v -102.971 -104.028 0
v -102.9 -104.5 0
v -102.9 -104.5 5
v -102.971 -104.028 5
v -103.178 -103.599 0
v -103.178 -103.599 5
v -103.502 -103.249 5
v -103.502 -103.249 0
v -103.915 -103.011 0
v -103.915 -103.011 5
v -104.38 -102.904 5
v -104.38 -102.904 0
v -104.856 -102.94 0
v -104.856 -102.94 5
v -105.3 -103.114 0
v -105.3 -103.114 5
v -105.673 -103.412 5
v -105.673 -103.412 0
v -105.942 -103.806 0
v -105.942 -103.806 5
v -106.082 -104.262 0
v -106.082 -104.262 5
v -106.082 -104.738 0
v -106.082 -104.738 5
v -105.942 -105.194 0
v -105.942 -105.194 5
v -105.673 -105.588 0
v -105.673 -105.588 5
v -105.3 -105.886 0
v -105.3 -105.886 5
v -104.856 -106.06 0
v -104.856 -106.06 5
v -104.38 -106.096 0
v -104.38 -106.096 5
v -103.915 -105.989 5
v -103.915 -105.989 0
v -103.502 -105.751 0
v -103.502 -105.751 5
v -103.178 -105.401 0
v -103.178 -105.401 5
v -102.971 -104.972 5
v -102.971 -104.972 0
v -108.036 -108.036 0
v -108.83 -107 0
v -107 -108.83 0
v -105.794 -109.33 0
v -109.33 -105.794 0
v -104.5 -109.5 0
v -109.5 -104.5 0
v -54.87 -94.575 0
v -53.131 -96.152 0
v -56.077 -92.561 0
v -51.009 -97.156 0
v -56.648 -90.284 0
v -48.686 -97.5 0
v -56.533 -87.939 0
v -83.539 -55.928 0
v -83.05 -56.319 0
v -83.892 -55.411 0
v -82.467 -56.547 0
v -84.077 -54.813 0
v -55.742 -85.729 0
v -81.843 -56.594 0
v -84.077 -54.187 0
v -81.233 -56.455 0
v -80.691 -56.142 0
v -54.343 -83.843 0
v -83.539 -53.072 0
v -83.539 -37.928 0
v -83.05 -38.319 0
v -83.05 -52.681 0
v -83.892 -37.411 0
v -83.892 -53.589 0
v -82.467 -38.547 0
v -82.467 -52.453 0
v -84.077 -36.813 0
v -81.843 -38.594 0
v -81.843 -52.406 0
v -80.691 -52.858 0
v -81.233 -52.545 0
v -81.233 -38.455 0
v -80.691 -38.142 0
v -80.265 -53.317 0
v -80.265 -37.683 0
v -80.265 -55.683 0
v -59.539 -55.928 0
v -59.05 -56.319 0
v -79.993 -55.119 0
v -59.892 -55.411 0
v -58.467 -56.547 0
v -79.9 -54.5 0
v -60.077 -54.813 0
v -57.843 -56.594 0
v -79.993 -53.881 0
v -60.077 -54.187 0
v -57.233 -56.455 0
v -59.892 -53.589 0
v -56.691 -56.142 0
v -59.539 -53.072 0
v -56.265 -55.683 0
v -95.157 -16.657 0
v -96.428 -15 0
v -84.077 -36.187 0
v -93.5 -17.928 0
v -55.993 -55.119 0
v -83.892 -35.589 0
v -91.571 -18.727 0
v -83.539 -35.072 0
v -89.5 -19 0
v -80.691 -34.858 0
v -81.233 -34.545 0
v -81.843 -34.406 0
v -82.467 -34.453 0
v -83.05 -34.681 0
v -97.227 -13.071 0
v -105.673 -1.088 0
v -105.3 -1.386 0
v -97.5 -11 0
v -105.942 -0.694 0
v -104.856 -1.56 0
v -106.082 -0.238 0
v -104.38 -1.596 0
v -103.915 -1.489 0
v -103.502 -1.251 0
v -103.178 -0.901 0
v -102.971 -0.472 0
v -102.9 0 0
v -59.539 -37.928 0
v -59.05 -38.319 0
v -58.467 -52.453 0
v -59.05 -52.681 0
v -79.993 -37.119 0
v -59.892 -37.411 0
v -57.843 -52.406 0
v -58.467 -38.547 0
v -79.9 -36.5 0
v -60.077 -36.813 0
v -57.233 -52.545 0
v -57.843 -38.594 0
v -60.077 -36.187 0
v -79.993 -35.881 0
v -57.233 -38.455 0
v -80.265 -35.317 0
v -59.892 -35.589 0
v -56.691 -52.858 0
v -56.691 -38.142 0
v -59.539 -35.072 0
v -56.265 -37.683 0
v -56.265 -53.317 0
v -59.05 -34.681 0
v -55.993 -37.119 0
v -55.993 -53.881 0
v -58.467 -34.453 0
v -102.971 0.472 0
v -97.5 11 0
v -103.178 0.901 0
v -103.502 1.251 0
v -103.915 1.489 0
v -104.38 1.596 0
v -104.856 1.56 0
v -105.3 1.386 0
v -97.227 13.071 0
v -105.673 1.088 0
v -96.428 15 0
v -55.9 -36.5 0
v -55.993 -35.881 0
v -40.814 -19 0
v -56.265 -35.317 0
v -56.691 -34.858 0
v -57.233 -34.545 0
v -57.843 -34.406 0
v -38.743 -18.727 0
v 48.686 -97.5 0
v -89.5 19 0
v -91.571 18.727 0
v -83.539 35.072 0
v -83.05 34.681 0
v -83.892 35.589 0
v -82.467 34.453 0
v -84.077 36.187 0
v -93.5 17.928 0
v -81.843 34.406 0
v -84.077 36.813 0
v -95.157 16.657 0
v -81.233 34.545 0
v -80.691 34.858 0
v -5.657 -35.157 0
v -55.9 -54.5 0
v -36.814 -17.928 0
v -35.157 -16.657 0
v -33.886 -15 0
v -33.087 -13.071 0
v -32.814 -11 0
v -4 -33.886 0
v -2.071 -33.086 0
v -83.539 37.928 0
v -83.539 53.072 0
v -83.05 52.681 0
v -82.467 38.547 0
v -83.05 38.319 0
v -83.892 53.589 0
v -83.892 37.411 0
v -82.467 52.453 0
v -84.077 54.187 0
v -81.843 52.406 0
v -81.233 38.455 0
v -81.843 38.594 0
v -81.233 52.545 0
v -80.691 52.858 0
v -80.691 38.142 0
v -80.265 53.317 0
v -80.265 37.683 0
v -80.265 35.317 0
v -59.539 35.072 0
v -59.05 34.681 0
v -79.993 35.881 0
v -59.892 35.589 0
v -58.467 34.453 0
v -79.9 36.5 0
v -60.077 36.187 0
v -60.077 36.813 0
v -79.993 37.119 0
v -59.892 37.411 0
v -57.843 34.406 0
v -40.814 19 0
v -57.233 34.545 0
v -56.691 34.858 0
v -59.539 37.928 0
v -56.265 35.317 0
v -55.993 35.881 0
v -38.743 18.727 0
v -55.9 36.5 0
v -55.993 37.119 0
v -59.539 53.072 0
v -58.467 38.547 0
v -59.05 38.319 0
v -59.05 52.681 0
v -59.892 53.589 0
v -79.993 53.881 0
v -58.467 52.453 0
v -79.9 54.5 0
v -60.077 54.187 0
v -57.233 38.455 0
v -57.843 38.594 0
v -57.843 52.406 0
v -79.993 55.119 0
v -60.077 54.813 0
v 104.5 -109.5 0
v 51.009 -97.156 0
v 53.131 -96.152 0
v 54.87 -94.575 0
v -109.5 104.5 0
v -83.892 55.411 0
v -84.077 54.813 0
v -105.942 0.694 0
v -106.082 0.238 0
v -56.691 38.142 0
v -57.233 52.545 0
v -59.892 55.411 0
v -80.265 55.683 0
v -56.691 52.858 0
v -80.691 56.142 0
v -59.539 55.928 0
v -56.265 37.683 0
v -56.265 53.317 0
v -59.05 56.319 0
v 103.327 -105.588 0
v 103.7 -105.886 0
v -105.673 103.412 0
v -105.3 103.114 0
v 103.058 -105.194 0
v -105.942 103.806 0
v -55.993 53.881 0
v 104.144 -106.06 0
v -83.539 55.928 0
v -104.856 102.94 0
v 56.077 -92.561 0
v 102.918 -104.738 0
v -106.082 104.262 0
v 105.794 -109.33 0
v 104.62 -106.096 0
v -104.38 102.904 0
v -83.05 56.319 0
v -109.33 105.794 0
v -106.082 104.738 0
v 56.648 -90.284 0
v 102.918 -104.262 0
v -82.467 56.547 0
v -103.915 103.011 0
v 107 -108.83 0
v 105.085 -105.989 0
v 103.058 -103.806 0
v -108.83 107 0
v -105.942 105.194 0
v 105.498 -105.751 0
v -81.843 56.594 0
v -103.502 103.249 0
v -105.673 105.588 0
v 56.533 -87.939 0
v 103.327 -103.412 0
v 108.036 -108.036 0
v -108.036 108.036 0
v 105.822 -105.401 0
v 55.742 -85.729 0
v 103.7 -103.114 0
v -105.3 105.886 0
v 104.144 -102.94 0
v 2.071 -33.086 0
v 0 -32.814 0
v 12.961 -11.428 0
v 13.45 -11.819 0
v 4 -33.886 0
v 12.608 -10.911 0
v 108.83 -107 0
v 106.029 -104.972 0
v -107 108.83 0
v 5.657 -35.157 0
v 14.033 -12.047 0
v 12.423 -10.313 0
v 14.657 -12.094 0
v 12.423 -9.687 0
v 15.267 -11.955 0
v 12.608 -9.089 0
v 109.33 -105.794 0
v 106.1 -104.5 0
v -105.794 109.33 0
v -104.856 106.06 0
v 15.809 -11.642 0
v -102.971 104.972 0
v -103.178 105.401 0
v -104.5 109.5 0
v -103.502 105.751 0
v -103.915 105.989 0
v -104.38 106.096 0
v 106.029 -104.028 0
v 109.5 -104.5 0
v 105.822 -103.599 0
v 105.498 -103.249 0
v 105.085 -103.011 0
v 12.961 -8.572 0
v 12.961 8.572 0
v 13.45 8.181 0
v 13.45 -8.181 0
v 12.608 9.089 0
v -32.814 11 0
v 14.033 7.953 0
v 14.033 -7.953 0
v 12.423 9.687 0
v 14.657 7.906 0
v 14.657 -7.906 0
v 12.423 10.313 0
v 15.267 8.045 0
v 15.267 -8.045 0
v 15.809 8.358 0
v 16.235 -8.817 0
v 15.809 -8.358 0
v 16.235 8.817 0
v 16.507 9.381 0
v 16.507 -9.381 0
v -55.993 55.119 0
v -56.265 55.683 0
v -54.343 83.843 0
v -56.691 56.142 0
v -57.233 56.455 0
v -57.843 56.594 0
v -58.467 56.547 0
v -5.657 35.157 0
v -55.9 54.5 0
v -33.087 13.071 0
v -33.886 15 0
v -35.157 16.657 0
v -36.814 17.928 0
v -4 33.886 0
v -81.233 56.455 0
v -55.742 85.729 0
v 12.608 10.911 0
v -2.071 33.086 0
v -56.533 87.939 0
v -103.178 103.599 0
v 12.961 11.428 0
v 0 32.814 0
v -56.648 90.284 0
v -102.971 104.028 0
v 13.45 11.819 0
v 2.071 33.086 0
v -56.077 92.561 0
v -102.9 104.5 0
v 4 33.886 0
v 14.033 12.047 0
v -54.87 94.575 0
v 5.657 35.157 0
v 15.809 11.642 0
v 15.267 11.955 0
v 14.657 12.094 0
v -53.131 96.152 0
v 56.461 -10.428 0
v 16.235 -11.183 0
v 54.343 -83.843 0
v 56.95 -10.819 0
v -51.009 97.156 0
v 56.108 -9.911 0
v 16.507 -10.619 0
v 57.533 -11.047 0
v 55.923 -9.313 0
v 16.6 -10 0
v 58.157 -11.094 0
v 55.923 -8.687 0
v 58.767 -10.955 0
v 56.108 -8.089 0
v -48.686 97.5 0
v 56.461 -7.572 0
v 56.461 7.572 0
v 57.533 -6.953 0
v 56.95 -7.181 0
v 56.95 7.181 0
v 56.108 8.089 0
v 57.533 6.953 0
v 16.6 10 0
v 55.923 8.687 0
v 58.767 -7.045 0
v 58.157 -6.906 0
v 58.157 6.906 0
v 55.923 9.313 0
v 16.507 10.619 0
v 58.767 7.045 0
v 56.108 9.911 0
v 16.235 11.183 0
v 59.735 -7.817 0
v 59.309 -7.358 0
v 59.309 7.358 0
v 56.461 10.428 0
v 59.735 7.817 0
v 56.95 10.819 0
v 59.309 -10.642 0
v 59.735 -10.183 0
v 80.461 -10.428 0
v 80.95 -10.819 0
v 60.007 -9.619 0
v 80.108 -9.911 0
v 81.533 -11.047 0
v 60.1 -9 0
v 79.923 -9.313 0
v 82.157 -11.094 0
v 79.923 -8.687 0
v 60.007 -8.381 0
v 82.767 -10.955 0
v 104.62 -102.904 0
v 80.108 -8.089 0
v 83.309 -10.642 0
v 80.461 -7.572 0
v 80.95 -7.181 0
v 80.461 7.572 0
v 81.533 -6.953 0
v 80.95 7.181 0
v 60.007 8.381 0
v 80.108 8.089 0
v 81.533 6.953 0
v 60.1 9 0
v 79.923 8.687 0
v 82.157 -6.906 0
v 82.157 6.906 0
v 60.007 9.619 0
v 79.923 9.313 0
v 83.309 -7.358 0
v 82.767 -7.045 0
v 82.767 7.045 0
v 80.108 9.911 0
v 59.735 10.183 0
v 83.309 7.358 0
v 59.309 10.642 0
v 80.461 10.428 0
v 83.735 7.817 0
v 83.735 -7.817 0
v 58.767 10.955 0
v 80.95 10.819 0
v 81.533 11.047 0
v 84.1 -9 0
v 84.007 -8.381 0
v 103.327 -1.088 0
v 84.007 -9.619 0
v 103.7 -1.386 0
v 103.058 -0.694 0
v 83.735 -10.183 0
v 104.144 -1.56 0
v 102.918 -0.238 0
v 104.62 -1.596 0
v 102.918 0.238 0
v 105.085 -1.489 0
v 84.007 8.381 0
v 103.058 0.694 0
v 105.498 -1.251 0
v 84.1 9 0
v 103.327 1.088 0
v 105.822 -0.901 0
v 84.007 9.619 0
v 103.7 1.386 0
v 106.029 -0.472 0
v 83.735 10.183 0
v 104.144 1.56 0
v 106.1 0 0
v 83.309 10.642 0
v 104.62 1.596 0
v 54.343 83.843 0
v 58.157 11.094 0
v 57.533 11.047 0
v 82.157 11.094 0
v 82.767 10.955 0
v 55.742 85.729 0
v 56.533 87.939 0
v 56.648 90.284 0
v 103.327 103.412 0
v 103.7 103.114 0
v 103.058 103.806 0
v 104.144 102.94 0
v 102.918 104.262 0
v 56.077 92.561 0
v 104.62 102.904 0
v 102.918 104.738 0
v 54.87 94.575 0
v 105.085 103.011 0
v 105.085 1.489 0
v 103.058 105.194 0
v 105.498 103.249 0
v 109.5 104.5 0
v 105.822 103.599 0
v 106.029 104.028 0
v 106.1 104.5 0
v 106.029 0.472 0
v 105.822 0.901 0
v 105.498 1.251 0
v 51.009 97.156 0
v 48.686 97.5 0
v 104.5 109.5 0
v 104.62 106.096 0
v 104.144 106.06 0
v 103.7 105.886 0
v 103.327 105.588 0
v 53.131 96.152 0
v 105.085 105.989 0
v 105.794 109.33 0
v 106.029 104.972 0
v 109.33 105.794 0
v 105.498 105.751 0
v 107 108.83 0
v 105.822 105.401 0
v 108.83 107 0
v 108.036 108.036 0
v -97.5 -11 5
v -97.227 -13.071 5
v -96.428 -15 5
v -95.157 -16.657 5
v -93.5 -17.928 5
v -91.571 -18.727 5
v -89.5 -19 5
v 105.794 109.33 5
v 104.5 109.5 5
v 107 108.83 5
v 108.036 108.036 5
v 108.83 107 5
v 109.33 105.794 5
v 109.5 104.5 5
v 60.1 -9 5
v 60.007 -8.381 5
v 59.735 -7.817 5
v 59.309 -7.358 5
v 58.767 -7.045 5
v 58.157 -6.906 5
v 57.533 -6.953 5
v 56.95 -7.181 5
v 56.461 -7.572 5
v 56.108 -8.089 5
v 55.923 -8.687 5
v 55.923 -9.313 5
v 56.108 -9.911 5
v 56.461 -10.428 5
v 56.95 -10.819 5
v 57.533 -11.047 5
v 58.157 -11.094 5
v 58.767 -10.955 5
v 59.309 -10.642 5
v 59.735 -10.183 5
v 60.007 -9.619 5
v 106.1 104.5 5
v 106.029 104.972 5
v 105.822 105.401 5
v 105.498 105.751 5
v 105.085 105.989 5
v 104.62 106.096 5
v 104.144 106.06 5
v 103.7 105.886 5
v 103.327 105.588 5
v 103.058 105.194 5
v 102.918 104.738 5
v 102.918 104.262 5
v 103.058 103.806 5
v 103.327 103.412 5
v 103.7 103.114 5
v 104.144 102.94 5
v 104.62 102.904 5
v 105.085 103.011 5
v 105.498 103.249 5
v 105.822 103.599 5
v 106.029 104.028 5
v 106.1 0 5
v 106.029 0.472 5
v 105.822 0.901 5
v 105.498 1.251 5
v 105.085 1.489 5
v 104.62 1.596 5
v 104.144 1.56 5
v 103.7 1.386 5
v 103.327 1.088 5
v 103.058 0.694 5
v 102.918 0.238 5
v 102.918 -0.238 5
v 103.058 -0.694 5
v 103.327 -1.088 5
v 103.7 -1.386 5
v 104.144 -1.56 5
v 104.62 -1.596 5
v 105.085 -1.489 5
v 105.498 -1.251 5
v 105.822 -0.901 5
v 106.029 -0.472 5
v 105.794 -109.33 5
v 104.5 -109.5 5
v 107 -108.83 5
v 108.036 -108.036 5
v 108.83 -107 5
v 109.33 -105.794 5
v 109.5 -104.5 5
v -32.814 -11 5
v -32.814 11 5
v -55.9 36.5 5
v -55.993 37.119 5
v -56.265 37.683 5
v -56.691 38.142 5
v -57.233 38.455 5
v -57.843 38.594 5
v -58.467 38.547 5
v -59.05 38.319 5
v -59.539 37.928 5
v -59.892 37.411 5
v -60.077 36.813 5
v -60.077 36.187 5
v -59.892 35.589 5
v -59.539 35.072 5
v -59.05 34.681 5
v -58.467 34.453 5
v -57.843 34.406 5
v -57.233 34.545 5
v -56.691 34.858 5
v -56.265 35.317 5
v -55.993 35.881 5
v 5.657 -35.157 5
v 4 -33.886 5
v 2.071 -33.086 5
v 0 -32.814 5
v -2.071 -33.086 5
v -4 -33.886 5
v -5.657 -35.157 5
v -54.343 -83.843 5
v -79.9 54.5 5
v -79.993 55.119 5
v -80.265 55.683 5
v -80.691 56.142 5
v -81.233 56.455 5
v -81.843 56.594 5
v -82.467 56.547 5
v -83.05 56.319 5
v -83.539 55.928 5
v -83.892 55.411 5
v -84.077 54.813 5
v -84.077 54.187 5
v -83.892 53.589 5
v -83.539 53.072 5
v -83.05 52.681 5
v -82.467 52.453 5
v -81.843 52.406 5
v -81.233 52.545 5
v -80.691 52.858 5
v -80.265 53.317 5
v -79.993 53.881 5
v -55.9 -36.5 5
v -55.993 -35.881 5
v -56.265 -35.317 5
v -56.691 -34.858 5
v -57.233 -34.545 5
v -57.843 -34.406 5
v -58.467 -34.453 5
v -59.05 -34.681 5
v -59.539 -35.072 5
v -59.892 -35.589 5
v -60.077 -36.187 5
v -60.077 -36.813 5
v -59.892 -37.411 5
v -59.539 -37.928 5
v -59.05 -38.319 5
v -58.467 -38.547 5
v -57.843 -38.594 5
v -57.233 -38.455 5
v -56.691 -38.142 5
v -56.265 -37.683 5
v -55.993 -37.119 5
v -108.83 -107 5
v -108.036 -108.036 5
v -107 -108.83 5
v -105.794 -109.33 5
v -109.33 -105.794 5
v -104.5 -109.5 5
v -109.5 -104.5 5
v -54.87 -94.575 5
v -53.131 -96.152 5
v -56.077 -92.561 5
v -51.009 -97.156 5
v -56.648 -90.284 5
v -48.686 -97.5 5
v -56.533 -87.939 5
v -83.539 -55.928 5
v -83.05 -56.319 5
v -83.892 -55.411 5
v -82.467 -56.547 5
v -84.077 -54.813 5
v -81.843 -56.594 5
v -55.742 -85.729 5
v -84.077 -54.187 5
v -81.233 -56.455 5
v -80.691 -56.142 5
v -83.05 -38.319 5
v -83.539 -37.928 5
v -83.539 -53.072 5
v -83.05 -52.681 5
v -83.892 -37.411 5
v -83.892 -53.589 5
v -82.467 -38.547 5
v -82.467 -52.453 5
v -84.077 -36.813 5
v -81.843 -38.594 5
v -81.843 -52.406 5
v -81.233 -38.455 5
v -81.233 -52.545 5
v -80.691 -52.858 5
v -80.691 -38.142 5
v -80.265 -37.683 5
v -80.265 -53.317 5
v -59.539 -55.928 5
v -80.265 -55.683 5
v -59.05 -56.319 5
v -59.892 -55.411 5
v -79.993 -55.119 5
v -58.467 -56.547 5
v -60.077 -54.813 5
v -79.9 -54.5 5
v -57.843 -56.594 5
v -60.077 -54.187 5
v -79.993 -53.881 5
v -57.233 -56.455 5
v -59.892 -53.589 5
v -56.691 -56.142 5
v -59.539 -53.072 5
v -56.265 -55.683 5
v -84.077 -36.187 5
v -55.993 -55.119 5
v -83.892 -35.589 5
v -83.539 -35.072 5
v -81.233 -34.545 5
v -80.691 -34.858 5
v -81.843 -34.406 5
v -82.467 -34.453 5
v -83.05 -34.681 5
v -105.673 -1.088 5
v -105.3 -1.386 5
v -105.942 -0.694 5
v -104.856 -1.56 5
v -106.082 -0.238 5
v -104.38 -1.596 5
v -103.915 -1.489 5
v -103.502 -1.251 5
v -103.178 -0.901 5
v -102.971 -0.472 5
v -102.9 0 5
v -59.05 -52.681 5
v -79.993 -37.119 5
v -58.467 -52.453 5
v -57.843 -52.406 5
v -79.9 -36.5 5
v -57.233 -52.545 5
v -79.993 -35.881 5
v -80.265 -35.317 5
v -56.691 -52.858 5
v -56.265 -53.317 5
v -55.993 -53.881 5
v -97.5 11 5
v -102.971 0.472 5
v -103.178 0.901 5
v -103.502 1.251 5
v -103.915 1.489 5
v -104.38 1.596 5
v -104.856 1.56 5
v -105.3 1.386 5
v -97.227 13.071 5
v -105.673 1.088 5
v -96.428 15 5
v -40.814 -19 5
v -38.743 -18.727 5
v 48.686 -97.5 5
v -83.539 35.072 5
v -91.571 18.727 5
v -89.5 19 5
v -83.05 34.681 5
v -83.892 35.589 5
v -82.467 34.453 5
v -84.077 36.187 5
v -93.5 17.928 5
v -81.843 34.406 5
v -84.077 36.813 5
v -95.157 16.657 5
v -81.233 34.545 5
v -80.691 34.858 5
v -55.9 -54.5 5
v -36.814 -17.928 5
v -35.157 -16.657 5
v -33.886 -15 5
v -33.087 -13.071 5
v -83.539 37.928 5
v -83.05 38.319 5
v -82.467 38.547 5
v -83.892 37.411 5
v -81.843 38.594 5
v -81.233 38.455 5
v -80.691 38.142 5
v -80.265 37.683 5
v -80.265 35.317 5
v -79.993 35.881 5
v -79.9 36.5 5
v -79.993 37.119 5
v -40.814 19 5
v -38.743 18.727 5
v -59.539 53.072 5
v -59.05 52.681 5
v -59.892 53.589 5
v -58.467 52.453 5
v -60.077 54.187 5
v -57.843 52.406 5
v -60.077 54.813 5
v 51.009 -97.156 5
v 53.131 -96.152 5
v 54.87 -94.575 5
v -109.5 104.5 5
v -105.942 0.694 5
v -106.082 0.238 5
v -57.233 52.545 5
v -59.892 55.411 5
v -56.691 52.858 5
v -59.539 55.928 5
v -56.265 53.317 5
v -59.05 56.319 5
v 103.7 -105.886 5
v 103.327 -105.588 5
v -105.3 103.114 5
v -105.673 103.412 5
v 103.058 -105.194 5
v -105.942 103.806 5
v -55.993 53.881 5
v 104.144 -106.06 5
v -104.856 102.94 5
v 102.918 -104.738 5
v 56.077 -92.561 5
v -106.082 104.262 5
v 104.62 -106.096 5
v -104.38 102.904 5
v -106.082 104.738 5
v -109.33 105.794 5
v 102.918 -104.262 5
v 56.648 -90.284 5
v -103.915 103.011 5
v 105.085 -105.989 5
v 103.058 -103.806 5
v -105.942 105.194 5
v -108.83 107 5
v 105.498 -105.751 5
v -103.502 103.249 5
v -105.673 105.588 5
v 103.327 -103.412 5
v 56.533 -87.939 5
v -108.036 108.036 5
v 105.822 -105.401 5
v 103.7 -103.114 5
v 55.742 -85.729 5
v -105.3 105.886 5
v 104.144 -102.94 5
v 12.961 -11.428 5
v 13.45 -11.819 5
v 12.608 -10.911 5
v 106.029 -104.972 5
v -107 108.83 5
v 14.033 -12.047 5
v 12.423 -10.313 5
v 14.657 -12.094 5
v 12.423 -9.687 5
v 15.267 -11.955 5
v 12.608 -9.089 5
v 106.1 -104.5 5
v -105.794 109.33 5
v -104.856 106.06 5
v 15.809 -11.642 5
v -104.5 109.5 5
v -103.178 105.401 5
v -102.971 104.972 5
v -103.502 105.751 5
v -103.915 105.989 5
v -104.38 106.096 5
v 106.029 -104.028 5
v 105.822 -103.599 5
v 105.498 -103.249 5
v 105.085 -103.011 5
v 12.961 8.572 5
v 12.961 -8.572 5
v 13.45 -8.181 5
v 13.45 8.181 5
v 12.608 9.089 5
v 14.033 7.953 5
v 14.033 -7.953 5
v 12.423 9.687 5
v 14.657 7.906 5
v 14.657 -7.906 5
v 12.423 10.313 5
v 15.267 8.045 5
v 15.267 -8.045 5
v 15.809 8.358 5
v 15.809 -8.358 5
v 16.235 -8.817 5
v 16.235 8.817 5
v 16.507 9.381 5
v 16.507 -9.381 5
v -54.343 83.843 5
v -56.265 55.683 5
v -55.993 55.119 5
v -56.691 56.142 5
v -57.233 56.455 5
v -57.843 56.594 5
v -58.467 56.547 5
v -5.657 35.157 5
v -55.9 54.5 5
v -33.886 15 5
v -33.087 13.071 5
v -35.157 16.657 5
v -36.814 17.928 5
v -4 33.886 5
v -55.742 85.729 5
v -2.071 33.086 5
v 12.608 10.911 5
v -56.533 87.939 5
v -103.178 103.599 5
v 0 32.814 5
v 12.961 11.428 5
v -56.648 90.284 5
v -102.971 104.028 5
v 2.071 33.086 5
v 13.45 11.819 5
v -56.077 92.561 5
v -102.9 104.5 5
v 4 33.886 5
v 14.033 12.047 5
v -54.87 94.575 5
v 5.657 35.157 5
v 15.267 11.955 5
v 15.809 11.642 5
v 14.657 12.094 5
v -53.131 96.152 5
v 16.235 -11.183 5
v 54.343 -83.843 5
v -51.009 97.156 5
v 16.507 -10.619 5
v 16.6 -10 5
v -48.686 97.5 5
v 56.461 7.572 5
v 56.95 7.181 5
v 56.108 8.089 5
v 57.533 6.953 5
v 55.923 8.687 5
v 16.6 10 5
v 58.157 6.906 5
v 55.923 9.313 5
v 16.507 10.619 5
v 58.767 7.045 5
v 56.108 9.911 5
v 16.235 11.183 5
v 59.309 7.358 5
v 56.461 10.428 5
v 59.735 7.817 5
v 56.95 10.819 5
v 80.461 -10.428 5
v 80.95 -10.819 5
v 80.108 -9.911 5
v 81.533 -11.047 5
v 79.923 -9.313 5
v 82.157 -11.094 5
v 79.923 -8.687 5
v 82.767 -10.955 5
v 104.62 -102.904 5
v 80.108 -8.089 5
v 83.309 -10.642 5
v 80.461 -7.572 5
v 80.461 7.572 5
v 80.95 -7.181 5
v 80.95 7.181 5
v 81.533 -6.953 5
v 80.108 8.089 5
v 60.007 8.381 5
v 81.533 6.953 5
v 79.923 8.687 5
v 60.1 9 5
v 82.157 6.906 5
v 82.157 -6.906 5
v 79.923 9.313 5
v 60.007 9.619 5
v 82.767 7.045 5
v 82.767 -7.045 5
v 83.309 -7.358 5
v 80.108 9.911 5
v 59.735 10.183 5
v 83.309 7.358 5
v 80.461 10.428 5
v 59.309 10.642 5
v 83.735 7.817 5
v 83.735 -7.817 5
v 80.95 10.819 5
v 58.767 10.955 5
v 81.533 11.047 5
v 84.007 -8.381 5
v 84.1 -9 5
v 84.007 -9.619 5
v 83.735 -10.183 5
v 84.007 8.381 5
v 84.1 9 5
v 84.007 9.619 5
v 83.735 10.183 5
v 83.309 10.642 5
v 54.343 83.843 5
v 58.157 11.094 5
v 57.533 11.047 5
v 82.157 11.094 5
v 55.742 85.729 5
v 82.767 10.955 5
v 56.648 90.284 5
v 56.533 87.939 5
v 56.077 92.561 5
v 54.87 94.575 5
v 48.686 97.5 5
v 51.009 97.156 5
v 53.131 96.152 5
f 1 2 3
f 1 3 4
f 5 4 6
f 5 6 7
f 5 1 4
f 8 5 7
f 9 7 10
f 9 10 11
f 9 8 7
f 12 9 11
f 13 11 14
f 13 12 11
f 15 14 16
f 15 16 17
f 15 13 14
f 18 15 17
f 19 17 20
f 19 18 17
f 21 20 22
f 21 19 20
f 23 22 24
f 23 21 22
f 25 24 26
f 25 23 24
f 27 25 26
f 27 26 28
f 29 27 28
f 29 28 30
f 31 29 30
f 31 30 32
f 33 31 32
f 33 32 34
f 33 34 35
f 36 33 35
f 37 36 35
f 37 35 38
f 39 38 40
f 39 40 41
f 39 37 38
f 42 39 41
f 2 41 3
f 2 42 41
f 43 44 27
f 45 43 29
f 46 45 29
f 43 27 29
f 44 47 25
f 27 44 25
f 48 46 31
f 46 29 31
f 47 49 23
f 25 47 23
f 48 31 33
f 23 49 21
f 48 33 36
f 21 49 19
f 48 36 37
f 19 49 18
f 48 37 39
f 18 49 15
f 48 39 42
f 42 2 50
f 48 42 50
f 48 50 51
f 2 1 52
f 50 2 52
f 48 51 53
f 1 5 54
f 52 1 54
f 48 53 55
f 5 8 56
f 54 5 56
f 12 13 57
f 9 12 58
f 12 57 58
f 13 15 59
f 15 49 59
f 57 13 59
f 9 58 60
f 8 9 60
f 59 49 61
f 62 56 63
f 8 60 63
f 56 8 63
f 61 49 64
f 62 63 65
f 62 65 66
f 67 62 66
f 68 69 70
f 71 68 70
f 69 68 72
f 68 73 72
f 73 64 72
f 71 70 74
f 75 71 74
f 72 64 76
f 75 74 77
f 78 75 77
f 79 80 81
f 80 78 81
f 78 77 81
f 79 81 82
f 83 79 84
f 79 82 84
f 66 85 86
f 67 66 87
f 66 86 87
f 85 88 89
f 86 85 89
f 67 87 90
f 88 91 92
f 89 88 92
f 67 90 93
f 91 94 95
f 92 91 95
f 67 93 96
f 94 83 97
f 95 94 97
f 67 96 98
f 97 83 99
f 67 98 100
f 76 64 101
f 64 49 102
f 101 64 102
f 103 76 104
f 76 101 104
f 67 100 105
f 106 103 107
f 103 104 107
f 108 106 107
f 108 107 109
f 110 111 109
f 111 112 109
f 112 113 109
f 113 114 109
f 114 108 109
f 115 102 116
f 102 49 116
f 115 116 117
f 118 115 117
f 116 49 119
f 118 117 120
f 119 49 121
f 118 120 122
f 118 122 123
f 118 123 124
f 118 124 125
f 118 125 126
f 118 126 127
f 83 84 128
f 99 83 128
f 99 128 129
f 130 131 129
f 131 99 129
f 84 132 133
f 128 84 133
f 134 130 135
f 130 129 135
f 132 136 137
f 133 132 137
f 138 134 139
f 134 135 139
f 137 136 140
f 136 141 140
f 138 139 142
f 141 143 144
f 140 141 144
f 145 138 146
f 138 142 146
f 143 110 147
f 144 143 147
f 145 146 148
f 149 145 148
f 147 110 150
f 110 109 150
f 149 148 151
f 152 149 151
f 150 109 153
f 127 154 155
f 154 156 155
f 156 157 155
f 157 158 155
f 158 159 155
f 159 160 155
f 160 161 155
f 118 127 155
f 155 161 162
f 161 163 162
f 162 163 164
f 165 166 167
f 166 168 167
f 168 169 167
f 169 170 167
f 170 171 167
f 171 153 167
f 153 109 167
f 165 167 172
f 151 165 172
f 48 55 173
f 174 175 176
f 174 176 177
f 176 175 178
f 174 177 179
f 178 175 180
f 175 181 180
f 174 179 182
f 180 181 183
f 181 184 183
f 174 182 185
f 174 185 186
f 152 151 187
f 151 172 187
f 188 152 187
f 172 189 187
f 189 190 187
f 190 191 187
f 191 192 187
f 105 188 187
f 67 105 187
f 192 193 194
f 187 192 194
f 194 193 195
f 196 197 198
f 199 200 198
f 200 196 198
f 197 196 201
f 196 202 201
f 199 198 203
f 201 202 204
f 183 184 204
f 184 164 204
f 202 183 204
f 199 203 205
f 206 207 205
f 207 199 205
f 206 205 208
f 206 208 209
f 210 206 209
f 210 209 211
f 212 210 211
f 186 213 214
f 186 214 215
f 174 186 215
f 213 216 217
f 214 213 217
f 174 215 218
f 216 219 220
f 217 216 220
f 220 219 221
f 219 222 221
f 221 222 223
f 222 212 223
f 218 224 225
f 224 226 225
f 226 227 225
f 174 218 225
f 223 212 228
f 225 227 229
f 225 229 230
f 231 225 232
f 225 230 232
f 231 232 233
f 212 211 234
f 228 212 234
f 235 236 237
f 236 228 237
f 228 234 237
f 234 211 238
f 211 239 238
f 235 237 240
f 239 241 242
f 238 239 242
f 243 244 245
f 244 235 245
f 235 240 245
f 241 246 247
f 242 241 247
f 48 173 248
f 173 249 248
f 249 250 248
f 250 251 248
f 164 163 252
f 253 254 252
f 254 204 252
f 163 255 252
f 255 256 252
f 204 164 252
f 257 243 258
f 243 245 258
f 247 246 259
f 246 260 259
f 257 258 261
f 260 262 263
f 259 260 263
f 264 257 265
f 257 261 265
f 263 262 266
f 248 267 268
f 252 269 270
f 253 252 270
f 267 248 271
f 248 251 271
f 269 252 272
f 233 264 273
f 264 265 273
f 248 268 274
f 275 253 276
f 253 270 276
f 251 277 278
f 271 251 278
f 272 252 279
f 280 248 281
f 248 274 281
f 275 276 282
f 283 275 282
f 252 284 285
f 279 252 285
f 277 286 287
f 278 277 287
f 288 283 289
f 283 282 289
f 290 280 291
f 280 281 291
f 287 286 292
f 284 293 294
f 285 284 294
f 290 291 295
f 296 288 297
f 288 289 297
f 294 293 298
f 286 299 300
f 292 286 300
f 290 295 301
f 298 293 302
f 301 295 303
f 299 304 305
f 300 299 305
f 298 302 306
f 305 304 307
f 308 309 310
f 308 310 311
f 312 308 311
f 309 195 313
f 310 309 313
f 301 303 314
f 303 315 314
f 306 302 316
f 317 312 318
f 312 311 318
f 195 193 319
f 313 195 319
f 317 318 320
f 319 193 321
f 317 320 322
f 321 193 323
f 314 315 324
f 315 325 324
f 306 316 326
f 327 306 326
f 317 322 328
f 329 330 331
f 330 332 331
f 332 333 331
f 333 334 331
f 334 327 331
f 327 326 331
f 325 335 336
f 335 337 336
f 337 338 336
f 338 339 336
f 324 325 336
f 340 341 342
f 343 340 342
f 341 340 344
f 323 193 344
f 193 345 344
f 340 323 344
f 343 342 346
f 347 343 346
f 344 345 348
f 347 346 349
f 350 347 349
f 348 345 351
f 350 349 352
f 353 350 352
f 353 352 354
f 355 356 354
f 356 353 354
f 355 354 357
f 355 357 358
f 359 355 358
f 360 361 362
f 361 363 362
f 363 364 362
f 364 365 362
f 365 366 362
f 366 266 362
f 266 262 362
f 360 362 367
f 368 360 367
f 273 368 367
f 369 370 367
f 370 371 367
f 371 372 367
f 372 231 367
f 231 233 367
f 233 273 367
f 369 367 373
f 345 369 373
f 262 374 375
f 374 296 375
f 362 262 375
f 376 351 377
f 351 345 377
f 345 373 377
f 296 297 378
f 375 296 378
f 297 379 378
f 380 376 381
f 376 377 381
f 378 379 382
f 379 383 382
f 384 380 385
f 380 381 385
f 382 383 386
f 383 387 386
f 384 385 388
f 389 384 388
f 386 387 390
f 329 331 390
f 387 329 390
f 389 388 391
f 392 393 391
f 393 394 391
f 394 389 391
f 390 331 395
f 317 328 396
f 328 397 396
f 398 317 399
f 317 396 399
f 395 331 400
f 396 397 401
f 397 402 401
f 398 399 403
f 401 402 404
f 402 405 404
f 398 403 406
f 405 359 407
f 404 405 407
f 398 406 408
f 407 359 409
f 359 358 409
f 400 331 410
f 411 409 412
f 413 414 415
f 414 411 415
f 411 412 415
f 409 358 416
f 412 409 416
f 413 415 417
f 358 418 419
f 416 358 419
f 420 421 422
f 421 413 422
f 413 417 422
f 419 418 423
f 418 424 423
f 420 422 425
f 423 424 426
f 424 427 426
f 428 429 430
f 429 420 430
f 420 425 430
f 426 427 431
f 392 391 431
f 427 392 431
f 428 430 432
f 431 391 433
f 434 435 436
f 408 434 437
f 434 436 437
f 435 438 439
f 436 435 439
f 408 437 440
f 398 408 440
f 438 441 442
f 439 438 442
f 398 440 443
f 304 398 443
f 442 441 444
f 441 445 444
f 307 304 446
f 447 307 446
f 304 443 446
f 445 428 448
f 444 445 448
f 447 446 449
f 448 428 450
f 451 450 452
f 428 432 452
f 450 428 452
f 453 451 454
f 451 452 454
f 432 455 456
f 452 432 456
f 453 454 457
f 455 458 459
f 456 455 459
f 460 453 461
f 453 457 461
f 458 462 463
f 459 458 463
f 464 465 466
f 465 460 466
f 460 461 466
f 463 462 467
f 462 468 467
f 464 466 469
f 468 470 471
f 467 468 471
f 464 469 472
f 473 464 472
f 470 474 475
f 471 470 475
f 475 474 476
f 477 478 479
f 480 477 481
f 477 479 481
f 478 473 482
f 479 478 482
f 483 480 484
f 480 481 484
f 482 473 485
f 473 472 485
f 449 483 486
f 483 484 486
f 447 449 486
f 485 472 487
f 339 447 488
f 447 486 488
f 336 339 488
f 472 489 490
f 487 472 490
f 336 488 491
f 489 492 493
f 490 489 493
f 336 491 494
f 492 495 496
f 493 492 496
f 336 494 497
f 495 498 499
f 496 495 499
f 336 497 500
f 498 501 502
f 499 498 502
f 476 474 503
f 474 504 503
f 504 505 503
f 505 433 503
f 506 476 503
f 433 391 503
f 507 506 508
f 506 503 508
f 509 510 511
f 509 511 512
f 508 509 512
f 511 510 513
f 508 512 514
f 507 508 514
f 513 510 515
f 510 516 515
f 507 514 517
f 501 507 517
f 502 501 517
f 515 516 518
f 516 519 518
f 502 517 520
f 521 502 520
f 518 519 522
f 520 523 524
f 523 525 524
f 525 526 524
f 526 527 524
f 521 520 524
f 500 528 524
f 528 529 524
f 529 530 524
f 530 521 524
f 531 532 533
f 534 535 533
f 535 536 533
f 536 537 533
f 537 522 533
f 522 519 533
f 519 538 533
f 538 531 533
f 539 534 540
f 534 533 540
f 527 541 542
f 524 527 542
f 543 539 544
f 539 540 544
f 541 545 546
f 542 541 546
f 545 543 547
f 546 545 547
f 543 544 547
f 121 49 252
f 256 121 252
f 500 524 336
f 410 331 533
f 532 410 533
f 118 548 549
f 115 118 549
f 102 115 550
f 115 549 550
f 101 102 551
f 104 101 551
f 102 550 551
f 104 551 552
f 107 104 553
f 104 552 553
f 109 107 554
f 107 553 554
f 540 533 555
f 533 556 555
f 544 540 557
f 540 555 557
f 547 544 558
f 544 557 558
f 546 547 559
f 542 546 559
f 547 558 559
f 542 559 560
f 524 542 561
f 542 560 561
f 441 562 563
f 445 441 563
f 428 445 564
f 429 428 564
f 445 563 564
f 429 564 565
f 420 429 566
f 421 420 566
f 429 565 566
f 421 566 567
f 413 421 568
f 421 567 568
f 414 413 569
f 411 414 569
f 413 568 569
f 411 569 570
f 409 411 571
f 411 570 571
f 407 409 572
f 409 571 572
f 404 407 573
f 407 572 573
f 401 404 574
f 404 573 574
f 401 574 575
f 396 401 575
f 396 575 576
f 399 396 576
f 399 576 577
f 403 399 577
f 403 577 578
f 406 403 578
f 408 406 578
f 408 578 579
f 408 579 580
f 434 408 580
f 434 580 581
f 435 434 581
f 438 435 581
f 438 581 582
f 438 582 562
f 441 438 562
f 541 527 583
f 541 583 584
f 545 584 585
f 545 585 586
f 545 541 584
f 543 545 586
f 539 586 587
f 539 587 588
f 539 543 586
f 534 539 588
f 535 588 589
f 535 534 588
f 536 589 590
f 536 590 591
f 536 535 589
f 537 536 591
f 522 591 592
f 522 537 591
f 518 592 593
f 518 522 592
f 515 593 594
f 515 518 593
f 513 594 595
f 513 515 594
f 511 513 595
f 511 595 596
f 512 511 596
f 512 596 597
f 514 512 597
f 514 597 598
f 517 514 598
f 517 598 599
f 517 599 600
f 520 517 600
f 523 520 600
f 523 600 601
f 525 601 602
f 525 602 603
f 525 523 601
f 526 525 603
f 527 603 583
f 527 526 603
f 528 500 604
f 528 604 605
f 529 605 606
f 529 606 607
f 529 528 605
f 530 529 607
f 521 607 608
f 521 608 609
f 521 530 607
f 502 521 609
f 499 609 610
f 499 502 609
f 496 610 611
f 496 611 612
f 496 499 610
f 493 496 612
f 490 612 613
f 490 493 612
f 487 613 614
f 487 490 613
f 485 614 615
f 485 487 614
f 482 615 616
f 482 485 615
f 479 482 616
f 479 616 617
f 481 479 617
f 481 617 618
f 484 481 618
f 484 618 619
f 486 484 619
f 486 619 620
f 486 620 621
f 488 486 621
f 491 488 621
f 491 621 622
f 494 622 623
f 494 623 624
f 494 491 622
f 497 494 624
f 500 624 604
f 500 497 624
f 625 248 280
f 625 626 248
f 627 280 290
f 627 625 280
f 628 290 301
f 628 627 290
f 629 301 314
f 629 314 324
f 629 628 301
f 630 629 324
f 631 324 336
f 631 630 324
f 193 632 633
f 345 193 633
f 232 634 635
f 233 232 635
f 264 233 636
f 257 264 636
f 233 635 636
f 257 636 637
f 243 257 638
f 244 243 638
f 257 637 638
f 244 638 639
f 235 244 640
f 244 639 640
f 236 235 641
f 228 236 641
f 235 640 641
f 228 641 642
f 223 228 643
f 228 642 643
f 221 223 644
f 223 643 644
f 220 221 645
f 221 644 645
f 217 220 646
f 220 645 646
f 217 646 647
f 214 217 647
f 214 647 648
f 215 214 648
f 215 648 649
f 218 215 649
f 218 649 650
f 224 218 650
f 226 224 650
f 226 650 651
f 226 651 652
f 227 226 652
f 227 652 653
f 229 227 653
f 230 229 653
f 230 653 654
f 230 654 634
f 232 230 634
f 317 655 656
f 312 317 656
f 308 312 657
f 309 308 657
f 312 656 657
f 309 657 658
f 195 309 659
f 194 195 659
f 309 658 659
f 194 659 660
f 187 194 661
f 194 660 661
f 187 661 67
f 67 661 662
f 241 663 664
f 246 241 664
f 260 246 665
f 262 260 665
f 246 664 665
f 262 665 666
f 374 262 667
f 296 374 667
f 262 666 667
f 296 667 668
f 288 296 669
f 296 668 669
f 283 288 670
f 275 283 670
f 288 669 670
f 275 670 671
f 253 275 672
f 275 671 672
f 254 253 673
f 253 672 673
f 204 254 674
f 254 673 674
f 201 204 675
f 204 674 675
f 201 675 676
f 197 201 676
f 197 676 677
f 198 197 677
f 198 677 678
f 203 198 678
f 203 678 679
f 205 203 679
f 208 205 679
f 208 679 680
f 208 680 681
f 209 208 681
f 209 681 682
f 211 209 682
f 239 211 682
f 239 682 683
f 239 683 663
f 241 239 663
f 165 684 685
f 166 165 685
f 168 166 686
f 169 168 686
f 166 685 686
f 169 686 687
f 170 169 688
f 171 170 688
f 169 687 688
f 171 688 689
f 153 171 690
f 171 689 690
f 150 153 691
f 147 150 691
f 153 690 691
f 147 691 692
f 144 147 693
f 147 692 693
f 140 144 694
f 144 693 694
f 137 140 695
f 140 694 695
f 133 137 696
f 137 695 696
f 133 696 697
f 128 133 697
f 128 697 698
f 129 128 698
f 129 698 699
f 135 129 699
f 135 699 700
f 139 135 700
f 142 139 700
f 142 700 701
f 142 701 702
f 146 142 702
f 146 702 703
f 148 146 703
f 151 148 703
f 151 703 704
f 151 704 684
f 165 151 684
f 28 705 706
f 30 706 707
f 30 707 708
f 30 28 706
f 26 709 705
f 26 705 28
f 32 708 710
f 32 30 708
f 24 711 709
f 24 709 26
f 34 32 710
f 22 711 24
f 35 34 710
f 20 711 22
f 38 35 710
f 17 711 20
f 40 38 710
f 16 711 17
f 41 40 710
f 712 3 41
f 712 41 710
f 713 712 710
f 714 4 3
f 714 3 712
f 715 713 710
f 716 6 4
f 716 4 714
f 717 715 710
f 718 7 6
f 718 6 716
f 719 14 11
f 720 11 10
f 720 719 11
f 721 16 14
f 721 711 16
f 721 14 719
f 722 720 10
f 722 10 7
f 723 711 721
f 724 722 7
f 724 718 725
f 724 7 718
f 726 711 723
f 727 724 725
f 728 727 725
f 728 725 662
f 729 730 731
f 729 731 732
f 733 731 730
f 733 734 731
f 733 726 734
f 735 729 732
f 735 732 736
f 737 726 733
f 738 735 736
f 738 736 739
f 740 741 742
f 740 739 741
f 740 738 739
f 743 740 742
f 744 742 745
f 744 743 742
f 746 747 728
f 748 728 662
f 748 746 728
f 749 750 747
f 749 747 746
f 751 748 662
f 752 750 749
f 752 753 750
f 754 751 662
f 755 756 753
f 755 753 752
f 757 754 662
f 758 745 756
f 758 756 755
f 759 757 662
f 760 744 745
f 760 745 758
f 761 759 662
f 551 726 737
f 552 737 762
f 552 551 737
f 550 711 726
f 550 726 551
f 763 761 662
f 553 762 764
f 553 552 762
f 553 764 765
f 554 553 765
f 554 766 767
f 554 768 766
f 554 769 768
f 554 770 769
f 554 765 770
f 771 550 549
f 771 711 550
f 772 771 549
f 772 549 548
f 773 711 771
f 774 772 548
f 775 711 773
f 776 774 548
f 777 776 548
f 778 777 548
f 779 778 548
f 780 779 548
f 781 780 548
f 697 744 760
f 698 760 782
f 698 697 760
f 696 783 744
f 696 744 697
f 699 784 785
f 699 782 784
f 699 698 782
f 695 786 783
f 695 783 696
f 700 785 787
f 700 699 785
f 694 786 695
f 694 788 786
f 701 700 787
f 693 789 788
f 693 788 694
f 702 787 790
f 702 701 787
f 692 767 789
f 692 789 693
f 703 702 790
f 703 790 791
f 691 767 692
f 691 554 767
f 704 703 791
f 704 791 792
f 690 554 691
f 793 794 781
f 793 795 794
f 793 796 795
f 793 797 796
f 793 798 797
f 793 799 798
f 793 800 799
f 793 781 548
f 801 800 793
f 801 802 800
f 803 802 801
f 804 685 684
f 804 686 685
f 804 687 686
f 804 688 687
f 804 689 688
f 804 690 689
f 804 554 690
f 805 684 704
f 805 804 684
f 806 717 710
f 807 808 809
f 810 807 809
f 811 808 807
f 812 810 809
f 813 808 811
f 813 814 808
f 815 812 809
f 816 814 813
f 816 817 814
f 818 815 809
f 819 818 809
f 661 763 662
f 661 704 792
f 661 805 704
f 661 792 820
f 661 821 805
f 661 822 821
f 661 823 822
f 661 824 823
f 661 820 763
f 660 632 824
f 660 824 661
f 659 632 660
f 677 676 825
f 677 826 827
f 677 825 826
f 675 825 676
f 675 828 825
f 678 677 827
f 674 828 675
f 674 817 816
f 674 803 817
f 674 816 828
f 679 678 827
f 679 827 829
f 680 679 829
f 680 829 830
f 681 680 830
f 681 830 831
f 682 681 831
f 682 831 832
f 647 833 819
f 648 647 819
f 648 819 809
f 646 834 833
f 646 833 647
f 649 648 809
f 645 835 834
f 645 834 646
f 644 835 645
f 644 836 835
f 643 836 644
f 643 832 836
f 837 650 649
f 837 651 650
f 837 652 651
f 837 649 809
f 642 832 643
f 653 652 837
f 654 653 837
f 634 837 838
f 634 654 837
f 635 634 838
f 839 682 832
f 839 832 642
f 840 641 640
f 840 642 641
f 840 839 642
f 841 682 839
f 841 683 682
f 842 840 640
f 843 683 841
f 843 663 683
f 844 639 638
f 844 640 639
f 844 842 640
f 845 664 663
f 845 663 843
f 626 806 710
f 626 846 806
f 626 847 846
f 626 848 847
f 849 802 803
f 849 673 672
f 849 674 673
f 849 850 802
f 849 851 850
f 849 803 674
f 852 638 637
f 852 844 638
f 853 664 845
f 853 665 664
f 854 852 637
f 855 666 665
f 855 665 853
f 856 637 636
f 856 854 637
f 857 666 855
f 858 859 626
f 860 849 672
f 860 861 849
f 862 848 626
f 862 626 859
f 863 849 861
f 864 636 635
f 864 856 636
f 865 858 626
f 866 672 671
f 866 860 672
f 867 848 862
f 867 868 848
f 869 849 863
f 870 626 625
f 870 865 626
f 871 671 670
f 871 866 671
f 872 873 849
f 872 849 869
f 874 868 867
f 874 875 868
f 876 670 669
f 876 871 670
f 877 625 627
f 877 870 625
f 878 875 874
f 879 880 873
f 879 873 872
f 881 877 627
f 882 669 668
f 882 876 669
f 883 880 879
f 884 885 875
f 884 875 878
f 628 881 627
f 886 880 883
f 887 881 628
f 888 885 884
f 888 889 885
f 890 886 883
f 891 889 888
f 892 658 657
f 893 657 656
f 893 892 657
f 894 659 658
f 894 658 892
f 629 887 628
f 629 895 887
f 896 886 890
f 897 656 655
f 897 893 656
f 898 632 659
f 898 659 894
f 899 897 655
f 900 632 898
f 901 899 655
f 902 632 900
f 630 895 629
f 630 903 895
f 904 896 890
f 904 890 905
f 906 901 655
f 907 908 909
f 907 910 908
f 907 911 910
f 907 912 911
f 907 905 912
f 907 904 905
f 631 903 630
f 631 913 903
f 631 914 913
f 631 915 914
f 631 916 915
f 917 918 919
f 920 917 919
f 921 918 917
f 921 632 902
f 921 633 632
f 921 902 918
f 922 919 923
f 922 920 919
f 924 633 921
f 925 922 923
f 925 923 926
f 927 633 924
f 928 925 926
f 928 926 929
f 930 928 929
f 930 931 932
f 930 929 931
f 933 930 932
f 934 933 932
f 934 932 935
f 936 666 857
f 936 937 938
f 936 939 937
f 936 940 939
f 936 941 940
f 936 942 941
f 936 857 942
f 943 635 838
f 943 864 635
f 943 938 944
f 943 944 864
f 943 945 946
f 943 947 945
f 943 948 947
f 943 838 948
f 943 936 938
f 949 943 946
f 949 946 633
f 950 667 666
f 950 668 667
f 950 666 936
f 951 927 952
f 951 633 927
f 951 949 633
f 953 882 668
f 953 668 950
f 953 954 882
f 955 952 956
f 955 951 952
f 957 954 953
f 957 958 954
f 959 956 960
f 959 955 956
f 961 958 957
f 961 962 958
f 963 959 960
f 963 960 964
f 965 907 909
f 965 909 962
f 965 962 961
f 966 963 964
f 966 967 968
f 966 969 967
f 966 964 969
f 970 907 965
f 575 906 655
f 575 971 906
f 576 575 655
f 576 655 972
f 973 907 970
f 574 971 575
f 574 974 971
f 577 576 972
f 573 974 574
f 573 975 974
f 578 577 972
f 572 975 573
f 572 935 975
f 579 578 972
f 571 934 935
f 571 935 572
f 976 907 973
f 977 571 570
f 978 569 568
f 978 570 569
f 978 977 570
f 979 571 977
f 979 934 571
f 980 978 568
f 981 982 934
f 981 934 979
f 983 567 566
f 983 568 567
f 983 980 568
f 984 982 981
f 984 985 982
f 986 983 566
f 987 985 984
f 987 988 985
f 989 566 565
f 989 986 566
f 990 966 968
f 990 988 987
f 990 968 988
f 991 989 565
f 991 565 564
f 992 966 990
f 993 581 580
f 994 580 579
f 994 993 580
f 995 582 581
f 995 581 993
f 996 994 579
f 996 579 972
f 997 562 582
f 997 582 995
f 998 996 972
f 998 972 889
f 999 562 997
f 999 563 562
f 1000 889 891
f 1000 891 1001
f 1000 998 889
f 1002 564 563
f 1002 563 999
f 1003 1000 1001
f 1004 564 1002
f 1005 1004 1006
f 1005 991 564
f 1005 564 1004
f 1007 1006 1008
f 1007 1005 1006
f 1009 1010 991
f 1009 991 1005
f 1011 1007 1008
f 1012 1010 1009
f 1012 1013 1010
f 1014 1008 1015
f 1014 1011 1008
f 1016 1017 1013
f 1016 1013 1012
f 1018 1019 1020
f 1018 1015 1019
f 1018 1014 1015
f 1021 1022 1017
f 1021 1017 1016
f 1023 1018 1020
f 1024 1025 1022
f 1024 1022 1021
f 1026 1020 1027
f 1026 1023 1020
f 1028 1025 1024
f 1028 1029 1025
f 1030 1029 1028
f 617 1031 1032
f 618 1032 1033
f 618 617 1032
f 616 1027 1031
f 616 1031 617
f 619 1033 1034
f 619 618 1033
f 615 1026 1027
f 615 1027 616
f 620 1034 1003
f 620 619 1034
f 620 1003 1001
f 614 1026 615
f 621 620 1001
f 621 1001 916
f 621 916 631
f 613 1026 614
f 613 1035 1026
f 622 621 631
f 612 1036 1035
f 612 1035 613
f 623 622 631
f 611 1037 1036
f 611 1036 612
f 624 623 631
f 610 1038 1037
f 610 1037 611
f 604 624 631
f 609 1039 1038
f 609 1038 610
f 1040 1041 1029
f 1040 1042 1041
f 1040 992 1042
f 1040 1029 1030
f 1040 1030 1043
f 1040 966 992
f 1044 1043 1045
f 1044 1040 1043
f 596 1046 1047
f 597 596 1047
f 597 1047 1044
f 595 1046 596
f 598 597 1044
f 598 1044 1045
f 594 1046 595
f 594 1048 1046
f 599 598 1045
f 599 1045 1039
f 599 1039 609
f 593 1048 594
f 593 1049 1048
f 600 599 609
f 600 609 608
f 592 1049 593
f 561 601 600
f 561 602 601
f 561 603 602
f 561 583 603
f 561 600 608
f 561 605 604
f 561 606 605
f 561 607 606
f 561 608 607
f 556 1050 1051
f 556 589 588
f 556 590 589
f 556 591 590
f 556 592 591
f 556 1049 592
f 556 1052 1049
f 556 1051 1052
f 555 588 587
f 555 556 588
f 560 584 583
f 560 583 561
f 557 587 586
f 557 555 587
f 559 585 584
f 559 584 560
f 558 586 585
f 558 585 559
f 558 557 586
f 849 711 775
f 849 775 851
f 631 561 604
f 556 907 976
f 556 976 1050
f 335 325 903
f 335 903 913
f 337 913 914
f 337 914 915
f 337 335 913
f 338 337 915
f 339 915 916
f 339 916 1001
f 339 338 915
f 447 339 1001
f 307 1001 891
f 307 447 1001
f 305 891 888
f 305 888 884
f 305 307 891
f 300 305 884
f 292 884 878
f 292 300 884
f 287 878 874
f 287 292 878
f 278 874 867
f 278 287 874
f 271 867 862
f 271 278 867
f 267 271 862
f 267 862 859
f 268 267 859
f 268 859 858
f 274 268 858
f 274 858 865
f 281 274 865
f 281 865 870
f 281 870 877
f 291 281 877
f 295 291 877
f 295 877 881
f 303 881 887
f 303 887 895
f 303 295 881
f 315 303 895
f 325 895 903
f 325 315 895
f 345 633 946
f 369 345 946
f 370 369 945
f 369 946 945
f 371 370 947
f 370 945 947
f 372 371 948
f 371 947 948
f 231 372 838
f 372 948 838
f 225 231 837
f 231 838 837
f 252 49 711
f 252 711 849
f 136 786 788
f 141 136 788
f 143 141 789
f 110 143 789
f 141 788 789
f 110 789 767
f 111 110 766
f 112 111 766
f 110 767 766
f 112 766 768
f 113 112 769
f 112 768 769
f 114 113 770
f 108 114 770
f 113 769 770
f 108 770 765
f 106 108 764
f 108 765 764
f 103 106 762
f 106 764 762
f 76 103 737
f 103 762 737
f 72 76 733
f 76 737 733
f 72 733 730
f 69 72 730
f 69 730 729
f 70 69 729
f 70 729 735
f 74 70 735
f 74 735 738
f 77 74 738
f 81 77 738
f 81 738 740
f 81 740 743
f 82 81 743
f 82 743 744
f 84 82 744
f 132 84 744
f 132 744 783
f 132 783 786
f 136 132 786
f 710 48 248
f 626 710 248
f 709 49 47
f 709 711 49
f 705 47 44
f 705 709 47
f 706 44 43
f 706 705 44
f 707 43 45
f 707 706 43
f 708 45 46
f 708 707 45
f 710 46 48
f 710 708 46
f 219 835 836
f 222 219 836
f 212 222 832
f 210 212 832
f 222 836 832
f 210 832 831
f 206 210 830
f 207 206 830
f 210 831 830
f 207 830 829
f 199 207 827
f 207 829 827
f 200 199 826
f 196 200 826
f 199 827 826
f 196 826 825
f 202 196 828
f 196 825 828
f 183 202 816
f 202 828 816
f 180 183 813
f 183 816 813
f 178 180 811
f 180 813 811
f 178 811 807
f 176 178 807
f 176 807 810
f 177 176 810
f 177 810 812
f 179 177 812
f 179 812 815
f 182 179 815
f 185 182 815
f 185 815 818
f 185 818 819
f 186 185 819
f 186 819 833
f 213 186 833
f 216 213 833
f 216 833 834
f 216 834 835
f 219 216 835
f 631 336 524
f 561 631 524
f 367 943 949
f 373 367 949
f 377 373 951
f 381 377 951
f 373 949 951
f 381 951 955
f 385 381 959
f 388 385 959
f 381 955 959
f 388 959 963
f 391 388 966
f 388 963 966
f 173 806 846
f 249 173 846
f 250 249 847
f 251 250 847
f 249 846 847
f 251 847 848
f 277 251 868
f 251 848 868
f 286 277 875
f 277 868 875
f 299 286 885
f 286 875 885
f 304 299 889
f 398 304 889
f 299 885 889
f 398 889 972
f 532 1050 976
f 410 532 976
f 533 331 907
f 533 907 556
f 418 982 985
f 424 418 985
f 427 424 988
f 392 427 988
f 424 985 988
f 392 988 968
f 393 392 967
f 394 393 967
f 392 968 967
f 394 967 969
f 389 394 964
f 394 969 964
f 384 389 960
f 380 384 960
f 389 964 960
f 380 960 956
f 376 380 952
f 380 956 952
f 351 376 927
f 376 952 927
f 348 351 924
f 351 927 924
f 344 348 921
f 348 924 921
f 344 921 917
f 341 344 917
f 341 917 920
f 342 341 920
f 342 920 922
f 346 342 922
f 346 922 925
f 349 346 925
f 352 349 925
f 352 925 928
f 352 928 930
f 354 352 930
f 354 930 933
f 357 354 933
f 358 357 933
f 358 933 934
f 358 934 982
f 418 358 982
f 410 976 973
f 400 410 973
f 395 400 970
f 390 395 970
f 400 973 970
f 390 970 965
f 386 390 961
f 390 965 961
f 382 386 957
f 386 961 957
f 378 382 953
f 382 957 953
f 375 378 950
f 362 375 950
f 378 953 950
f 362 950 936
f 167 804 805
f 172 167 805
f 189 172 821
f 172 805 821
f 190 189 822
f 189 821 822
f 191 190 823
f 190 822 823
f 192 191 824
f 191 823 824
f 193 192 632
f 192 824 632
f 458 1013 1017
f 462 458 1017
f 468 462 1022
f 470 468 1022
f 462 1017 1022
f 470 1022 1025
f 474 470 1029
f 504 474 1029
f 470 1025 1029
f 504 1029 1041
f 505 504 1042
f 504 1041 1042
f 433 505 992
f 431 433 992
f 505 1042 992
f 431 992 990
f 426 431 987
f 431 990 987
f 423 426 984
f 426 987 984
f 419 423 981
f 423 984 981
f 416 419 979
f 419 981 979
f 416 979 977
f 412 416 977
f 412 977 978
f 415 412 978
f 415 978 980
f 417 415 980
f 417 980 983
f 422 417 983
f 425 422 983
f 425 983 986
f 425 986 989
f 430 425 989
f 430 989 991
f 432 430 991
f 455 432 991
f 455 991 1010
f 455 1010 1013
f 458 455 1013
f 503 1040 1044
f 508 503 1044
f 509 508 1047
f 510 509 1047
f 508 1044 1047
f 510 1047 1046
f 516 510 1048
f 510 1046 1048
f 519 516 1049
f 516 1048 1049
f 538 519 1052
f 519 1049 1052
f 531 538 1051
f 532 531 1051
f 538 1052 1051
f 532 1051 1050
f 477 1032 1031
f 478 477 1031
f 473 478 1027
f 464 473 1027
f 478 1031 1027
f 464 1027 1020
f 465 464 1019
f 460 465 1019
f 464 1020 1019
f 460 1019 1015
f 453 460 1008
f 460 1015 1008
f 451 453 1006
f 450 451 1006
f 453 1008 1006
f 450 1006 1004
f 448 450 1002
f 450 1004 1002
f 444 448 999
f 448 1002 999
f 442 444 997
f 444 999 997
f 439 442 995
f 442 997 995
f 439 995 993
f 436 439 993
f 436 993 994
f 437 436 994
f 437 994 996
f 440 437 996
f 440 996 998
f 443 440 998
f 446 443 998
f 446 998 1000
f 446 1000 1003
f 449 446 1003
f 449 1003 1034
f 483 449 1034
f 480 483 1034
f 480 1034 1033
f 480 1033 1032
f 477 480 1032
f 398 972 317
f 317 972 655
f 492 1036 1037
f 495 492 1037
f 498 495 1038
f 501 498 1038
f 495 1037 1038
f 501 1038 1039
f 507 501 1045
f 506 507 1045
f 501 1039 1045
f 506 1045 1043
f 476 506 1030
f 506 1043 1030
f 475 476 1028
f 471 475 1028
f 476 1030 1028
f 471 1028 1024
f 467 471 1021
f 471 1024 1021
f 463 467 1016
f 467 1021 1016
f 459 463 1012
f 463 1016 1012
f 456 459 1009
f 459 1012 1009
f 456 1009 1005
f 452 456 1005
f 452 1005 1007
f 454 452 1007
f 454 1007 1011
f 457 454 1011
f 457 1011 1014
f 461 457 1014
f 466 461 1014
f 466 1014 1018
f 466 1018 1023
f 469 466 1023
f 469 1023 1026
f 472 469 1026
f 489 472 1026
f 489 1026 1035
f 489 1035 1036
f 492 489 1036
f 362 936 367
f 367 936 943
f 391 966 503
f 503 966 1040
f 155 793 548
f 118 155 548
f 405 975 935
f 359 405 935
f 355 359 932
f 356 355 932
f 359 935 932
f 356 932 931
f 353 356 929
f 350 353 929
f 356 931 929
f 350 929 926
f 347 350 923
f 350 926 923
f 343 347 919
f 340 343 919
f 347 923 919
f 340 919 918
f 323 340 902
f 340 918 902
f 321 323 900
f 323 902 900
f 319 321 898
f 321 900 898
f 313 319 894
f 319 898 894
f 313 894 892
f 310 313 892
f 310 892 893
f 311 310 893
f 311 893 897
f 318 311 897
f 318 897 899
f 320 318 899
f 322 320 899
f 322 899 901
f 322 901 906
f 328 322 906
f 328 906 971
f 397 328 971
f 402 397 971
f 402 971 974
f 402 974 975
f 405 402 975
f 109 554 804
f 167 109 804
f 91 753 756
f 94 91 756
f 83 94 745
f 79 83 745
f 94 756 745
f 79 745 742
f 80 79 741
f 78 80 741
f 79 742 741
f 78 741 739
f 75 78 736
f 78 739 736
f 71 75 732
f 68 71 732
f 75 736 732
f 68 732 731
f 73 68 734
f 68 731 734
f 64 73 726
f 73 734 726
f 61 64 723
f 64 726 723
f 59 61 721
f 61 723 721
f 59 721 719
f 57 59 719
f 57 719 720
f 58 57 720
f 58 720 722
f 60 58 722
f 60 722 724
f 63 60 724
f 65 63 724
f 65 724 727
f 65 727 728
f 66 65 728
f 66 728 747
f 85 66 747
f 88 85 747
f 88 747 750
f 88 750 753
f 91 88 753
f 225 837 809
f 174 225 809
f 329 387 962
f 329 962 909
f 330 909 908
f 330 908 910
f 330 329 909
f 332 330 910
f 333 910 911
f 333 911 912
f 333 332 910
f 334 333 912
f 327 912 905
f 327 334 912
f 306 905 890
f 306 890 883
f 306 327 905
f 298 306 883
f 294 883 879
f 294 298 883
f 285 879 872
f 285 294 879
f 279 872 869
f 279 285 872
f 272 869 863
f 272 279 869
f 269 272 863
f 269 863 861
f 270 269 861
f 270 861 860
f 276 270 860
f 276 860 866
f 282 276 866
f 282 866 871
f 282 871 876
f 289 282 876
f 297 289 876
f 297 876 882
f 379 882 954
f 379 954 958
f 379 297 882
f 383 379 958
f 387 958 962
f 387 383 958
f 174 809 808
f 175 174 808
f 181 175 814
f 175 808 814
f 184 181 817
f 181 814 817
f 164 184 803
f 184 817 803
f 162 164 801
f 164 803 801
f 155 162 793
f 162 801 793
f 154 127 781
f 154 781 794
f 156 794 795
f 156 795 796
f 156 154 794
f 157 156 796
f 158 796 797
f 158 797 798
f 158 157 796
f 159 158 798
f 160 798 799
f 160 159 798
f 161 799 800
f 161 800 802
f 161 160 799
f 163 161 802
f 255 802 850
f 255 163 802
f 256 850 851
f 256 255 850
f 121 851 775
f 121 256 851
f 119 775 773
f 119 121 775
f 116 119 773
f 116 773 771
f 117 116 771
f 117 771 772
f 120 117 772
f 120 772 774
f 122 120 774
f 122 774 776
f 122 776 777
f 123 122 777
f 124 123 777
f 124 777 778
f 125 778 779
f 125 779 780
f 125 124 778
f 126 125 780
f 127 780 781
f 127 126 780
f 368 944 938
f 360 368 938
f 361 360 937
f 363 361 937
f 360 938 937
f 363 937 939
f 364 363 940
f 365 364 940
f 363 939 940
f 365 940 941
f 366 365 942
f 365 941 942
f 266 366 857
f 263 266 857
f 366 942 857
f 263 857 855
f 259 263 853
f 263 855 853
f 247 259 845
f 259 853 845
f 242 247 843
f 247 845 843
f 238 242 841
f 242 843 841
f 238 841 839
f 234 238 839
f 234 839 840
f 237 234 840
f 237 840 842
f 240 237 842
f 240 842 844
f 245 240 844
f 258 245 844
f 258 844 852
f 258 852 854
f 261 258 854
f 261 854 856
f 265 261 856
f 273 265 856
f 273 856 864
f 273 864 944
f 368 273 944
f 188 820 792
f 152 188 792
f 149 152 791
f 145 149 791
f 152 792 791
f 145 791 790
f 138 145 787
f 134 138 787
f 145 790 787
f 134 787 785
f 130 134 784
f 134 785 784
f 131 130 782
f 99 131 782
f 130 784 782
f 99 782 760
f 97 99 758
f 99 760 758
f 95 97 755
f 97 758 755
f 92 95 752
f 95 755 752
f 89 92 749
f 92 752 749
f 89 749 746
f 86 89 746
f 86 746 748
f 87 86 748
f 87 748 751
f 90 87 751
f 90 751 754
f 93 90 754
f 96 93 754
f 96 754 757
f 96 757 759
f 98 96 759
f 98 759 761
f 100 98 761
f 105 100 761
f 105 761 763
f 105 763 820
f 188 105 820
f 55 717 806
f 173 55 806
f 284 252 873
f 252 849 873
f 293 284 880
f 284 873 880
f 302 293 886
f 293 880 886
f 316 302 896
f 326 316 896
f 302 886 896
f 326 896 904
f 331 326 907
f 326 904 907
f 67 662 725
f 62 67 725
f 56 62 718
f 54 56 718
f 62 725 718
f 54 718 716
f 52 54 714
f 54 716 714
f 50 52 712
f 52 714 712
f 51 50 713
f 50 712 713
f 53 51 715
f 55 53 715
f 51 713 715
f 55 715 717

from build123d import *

# Parameters (mm, degrees)
F0_W     = 219
F0_H     = 219
F0_R     = 1.6
F1_DEPTH = 5
F2_R     = 2.1
F3_DEPTH = 25
F4_R     = 5
F6_DEPTH = 25


with BuildPart() as f1:
    # F0 (on Top) → F1 (new body)
    with BuildSketch(Plane.XY):
        Rectangle(F0_W, F0_H)
        with Locations((-104.5, -104.5)):
            Circle(F0_R, mode=Mode.SUBTRACT)
        with Locations((104.5, -104.5)):
            Circle(F0_R, mode=Mode.SUBTRACT)
        with Locations((-104.5, 0)):
            Circle(F0_R, mode=Mode.SUBTRACT)
        with Locations((-104.5, 104.5)):
            Circle(F0_R, mode=Mode.SUBTRACT)
        with Locations((104.5, 0)):
            Circle(F0_R, mode=Mode.SUBTRACT)
        with Locations((104.5, 104.5)):
            Circle(F0_R, mode=Mode.SUBTRACT)
    extrude(amount=F1_DEPTH)

    # F2 (on face) → F3 (cut)
    with BuildSketch(Plane.XY.offset(5)):
        with Locations((-82, -54.5)):
            Circle(F2_R)
        with Locations((-58, -54.5)):
            Circle(F2_R)
        with Locations((-58, -36.5)):
            Circle(F2_R)
        with Locations((-82, -36.5)):
            Circle(F2_R)
        with Locations((-82, 36.5)):
            Circle(F2_R)
        with Locations((-82, 54.5)):
            Circle(F2_R)
        with Locations((-58, 54.5)):
            Circle(F2_R)
        with Locations((-58, 36.5)):
            Circle(F2_R)
        with Locations((14.5, -10)):
            Circle(F2_R)
        with Locations((58, -9)):
            Circle(F2_R)
        with Locations((82, -9)):
            Circle(F2_R)
        with Locations((82, 9)):
            Circle(F2_R)
        with Locations((58, 9)):
            Circle(F2_R)
        with Locations((14.5, 10)):
            Circle(F2_R)
    extrude(amount=-F3_DEPTH, mode=Mode.SUBTRACT)

    # F4
    f4_edges = [f1.edges().sort_by_distance(p)[0] for p in [
        (109.5, 109.5, 2.5),
        (109.5, -109.5, 2.5),
        (-109.5, -109.5, 2.5),
        (-109.5, 109.5, 2.5),
    ]]
    fillet(f4_edges, radius=F4_R)

    # F5 (on face) → F6 (cut)
    with BuildSketch(Plane.XY.offset(5)):
        with BuildLine():
            Line((-5.656854, -35.156854), (-54.343146, -83.843146))
            ThreePointArc((-54.343146, -83.843146), (-56.077328, -92.561467), (-48.686292, -97.5))
            Line((-48.686292, -97.5), (48.686292, -97.5))
            ThreePointArc((48.686292, -97.5), (56.077328, -92.561467), (54.343146, -83.843146))
            Line((54.343146, -83.843146), (5.656854, -35.156854))
            ThreePointArc((5.656854, -35.156854), (0, -32.813708), (-5.656854, -35.156854))
        make_face()
        with BuildLine():
            Line((5.656854, 35.156854), (54.343146, 83.843146))
            ThreePointArc((54.343146, 83.843146), (56.077328, 92.561467), (48.686292, 97.5))
            Line((48.686292, 97.5), (-48.686292, 97.5))
            ThreePointArc((-48.686292, 97.5), (-56.077328, 92.561467), (-54.343146, 83.843146))
            Line((-54.343146, 83.843146), (-5.656854, 35.156854))
            ThreePointArc((-5.656854, 35.156854), (0, 32.813708), (5.656854, 35.156854))
        make_face()
        with BuildLine():
            Line((-89.5, -19), (-40.814, -19))
            ThreePointArc((-40.814, -19), (-35.157146, -16.656854), (-32.814, -11))
            Line((-32.814, -11), (-32.814, 11))
            ThreePointArc((-32.814, 11), (-35.157146, 16.656854), (-40.814, 19))
            Line((-40.814, 19), (-89.5, 19))
            ThreePointArc((-89.5, 19), (-95.156854, 16.656854), (-97.5, 11))
            Line((-97.5, 11), (-97.5, -11))
            ThreePointArc((-97.5, -11), (-95.156854, -16.656854), (-89.5, -19))
        make_face()
    extrude(amount=-F6_DEPTH, mode=Mode.SUBTRACT)


solid = f1.part
